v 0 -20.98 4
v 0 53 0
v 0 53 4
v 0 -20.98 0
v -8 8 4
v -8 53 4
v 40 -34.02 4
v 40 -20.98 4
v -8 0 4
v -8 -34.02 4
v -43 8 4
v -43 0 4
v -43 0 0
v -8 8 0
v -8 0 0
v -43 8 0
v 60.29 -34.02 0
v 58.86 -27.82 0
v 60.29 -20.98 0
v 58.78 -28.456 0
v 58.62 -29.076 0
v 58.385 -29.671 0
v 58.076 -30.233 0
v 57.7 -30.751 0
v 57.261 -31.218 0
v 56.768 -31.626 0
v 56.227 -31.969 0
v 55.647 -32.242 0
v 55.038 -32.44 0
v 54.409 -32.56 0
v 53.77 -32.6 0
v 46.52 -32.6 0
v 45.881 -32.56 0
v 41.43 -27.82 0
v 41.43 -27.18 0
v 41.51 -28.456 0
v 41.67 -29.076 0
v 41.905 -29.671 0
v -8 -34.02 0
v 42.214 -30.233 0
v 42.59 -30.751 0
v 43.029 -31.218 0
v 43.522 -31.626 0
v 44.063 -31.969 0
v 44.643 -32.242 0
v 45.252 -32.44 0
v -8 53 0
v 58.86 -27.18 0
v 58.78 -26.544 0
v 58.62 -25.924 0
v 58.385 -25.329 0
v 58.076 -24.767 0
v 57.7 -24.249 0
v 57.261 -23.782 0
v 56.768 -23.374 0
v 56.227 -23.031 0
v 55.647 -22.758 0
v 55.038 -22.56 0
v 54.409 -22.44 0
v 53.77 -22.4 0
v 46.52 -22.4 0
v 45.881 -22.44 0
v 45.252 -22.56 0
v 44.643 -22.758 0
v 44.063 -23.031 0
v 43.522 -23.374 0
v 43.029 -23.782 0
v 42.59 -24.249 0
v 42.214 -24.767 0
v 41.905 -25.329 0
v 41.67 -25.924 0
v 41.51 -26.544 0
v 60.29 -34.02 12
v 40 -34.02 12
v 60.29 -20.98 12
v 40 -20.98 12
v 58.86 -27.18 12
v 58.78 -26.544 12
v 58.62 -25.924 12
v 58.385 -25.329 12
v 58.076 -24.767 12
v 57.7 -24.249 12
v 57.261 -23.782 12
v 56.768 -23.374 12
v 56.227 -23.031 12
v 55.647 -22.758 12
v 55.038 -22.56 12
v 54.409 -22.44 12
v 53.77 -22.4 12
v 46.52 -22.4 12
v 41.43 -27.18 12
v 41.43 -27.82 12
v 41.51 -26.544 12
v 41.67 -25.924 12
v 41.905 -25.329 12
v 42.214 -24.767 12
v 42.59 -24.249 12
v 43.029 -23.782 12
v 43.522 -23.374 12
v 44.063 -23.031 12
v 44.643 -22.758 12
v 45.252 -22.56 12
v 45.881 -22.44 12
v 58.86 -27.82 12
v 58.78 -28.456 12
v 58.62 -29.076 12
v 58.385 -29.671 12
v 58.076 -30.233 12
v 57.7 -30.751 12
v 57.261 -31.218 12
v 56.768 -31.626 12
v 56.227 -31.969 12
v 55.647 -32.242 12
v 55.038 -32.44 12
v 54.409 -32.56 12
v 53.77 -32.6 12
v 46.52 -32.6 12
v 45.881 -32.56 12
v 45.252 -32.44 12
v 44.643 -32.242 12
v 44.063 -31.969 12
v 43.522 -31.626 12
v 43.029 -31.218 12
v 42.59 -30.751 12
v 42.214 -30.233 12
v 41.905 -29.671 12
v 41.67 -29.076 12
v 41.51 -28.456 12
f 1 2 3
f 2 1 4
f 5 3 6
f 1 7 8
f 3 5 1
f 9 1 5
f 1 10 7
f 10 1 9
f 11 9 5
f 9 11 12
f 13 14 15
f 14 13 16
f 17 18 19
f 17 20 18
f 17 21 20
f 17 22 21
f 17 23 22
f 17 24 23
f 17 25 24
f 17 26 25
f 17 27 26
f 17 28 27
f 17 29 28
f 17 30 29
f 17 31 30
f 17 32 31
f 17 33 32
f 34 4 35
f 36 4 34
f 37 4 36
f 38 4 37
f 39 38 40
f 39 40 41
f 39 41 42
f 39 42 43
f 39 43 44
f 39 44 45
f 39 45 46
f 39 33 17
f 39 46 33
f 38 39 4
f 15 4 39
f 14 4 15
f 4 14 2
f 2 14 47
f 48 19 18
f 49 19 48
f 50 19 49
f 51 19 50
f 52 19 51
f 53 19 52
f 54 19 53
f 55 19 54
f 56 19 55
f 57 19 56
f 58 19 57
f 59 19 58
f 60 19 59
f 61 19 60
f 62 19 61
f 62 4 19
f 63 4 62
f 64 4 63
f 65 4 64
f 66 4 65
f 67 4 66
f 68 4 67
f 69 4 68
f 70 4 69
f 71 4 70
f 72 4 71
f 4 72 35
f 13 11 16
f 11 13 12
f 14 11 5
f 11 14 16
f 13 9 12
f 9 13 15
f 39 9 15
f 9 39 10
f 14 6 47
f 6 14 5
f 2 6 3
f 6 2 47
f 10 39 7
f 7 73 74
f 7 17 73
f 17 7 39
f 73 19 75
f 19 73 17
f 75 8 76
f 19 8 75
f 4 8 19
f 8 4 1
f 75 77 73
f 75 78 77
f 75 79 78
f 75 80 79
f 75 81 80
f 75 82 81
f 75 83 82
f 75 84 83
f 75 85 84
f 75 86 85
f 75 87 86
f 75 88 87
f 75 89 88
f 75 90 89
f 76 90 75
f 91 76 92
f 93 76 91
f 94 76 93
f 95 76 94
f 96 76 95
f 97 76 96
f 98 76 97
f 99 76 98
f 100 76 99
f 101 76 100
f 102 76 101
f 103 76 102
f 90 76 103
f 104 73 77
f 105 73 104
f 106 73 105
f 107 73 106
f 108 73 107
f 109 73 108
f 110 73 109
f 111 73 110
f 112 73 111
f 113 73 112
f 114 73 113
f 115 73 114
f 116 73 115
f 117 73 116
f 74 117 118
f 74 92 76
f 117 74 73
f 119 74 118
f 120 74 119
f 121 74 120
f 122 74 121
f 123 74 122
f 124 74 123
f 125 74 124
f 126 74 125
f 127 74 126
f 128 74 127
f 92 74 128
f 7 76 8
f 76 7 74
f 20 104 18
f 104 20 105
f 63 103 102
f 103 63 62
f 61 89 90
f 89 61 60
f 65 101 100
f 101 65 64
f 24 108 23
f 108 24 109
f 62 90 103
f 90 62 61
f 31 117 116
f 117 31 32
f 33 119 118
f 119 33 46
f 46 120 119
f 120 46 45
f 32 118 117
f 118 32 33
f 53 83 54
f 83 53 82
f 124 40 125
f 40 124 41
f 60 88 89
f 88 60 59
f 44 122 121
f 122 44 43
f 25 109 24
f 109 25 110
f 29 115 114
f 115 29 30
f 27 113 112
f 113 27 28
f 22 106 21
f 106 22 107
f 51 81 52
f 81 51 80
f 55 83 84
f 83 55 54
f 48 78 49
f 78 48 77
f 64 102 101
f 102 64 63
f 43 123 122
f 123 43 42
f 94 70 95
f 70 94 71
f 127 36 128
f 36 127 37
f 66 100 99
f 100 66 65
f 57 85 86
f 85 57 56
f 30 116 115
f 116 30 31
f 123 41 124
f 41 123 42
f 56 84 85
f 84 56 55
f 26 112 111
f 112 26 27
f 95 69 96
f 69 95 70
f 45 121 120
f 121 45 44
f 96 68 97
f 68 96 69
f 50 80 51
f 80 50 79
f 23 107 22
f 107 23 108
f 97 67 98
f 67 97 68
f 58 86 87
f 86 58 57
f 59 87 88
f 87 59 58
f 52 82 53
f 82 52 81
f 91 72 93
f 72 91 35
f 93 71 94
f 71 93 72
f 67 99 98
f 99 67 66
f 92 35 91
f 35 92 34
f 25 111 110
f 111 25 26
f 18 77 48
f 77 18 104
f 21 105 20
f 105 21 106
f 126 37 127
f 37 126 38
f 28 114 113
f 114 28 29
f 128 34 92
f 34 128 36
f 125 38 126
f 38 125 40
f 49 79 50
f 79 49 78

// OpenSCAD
// [FL_INDEX: keywords="openscad, 3d_parametric, iSight_mount_for_M2, csg_solid" | COT="Parametric OpenSCAD design from 3DCodeverse"]
// Title: iSight mount for M2

/* [General] */
layout = "all";
extrusion_width = .38;
wall_width = extrusion_width * 4;
base_height = 4;

/* [Mounting Hole] */
mount_hole_major_axis = 17.25;
mount_hole_minor_axis = 10;
// Measured off the bottom of the mount (includive of base_height).
mount_block_height = 12;
clearance = 0.1;
// Offset off front wall of gantry clamp to place the iSight edge.
y_offset = 10;
// Offset off side wall of gantry clamp to place mounting block.
x_offset = 40;

/* [Hidden] */
isight_radius = 35/2;
r = mount_hole_minor_axis/2;
$fn = 50;

module isight_mount(h = 5, c = clearance) {

  linear_extrude(height = h, center = true)
  difference() {
    hull() {
      translate([0, r]) circle(r + c + wall_width);
      translate([0, mount_hole_major_axis - r]) circle(r + c + wall_width);
    }
    hull() {
      translate([0, r]) circle(r + c);
      translate([0, mount_hole_major_axis - r]) circle(r + c);
    }
  }
}

module mount_test() {
  for (i = [0 : 3]) {
    translate([i * 15, 0]) mount(c = .1 * i);
  }
}

module hole(h, c = clearance) {
  linear_extrude(height = h, center = true)
  hull() {
    translate([0, r]) circle(r + c);
    translate([0, mount_hole_major_axis - r]) circle(r + c);
  }
}

module all() {
  difference() {
    union() {
      translate([-43, 0, 0])
      cube([43, 8, base_height]);

      translate([-8, -(y_offset + isight_radius + r + wall_width), 0])
      cube([8, y_offset + isight_radius + r + wall_width + 53, base_height]);

      translate([-8, -(y_offset + isight_radius + r + wall_width), 0])
      cube([8 + x_offset + mount_hole_major_axis + 2*wall_width, mount_hole_minor_axis + 2*wall_width, base_height]);

      translate([x_offset, -(y_offset + isight_radius + r + wall_width), 0])
      cube([mount_hole_major_axis + 2*wall_width, mount_hole_minor_axis + 2*wall_width, mount_block_height]);
    }

    translate([x_offset + wall_width, -y_offset - isight_radius, mount_block_height])
    rotate([0, 0, -90]) hole(h = 60);
  }
}

if (layout == "isight_mount_test") mount_test();
else all();
